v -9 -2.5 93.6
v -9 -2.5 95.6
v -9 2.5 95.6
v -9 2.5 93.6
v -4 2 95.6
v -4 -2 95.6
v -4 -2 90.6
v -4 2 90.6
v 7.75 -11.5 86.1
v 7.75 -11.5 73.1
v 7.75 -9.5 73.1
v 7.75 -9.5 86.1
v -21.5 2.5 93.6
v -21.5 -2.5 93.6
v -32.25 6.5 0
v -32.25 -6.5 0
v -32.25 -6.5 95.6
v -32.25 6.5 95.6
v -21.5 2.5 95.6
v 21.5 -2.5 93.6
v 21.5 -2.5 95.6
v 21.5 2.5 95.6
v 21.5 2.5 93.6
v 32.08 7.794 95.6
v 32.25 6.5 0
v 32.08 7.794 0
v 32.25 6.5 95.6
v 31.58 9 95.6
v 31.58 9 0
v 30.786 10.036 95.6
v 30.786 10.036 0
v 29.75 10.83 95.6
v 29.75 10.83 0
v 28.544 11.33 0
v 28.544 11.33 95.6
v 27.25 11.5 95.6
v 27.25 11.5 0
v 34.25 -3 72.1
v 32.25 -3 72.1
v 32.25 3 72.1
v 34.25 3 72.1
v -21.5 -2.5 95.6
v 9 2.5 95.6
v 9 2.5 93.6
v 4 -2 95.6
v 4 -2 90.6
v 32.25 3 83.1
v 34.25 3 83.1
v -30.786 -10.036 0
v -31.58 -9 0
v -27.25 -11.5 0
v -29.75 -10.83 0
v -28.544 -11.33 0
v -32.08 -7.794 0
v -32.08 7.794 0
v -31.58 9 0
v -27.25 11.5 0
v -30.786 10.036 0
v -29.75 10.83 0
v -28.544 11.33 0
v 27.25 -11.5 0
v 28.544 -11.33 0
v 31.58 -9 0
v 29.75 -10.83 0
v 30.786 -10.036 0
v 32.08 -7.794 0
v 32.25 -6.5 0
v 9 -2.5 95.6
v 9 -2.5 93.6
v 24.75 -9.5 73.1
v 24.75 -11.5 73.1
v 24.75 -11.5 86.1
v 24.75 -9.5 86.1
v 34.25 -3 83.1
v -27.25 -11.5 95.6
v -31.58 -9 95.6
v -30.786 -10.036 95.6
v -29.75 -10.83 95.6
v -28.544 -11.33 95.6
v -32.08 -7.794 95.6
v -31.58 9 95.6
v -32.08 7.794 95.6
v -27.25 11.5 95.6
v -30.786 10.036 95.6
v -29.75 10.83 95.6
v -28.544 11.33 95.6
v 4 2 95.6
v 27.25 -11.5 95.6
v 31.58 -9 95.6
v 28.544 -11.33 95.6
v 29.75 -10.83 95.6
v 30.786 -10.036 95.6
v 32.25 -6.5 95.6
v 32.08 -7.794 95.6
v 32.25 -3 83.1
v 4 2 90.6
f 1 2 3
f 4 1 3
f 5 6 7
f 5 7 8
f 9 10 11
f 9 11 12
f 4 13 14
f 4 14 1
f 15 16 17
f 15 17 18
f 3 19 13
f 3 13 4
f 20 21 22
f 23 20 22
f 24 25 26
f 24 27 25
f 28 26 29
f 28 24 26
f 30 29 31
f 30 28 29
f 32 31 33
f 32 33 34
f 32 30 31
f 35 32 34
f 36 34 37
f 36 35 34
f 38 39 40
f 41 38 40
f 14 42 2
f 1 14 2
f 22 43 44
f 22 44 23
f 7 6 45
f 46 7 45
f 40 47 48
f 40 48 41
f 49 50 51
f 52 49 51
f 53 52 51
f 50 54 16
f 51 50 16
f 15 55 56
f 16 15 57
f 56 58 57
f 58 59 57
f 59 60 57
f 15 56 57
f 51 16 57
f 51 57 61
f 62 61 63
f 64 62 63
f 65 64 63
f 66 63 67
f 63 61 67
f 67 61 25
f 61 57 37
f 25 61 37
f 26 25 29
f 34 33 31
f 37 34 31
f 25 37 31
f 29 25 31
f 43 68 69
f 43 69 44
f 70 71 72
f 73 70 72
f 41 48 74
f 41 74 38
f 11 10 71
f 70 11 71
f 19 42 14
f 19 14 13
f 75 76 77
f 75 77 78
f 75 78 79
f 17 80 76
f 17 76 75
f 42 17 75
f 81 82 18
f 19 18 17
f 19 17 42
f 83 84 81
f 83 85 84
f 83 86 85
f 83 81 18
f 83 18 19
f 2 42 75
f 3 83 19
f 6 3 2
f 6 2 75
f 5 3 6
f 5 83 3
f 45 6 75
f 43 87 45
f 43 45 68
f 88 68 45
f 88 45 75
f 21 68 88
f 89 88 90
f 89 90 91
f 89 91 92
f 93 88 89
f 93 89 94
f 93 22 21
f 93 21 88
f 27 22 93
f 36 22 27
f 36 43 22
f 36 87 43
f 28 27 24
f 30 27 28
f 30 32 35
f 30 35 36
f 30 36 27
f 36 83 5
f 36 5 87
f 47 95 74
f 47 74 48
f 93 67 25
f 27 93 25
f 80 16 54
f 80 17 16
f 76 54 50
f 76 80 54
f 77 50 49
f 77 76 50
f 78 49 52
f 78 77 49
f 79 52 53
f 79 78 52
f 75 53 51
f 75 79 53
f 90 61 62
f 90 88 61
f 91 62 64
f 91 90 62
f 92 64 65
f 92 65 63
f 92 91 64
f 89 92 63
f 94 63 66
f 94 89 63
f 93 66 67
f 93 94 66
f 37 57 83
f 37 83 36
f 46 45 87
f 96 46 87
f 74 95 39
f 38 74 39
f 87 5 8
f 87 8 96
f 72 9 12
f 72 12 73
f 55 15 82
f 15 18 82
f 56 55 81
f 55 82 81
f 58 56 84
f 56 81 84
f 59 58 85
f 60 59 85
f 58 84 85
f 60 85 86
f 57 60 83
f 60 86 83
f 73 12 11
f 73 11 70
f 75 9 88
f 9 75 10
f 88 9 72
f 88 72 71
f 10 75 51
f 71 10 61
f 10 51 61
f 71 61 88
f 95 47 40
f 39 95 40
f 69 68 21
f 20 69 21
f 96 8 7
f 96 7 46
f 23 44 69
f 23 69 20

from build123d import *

# Parameters (mm, degrees)
SKETCH1_W           = 64.5
SKETCH1_H           = 23
BOSS_EXTRUDE1_DEPTH = 95.6
FILLET1_R           = 5
SKETCH2_W           = 8
SKETCH2_H           = 4
CUT_EXTRUDE1_DEPTH  = 5
SKETCH3_W           = 11
SKETCH3_H           = 6
BOSS_EXTRUDE2_DEPTH = 2
SKETCH4_W           = 12.5
SKETCH4_H           = 5
CUT_EXTRUDE2_DEPTH  = 2
SKETCH5_W           = 17
SKETCH5_H           = 13
CUT_EXTRUDE3_DEPTH  = 2


with BuildPart() as part:
    # Sketch1 → Boss-Extrude1 (new body)
    with BuildSketch(Plane.XY):
        Rectangle(SKETCH1_W, SKETCH1_H)
    extrude(amount=BOSS_EXTRUDE1_DEPTH)

    # Fillet1
    fillet1_edges = [part.edges().sort_by_distance(p)[0] for p in [
        (32.25, -11.5, 47.8),
        (-32.25, -11.5, 47.8),
        (-32.25, 11.5, 47.8),
        (32.25, 11.5, 47.8),
    ]]
    fillet(fillet1_edges, radius=FILLET1_R)

    # Sketch2 → Cut-Extrude1 (cut)
    with BuildSketch(Plane.XY.offset(95.6)):
        Rectangle(SKETCH2_W, SKETCH2_H)
    extrude(amount=-CUT_EXTRUDE1_DEPTH, mode=Mode.SUBTRACT)

    # Sketch4 → Cut-Extrude2 (cut)
    with BuildSketch(Plane.XY.offset(95.6)):
        with Locations((-15.25, 0)):
            Rectangle(SKETCH4_W, SKETCH4_H)
        with Locations((15.25, 0)):
            Rectangle(SKETCH4_W, SKETCH4_H)
    extrude(amount=-CUT_EXTRUDE2_DEPTH, mode=Mode.SUBTRACT)

    # Sketch5 → Cut-Extrude3 (cut)
    with BuildSketch(Plane.XZ.offset(11.5)):
        with Locations((16.25, 79.6)):
            Rectangle(SKETCH5_W, SKETCH5_H)
    extrude(amount=-CUT_EXTRUDE3_DEPTH, mode=Mode.SUBTRACT)


with BuildPart() as body_2:
    # Sketch3 → Boss-Extrude2 (new body)
    with BuildSketch(Plane(origin=(32.25, 0, 0), x_dir=(0, 0, -1), z_dir=(1, 0, 0))):
        with Locations((-77.6, 0)):
            Rectangle(SKETCH3_W, SKETCH3_H)
    extrude(amount=BOSS_EXTRUDE2_DEPTH)


solid = Compound([part.part, body_2.part])
